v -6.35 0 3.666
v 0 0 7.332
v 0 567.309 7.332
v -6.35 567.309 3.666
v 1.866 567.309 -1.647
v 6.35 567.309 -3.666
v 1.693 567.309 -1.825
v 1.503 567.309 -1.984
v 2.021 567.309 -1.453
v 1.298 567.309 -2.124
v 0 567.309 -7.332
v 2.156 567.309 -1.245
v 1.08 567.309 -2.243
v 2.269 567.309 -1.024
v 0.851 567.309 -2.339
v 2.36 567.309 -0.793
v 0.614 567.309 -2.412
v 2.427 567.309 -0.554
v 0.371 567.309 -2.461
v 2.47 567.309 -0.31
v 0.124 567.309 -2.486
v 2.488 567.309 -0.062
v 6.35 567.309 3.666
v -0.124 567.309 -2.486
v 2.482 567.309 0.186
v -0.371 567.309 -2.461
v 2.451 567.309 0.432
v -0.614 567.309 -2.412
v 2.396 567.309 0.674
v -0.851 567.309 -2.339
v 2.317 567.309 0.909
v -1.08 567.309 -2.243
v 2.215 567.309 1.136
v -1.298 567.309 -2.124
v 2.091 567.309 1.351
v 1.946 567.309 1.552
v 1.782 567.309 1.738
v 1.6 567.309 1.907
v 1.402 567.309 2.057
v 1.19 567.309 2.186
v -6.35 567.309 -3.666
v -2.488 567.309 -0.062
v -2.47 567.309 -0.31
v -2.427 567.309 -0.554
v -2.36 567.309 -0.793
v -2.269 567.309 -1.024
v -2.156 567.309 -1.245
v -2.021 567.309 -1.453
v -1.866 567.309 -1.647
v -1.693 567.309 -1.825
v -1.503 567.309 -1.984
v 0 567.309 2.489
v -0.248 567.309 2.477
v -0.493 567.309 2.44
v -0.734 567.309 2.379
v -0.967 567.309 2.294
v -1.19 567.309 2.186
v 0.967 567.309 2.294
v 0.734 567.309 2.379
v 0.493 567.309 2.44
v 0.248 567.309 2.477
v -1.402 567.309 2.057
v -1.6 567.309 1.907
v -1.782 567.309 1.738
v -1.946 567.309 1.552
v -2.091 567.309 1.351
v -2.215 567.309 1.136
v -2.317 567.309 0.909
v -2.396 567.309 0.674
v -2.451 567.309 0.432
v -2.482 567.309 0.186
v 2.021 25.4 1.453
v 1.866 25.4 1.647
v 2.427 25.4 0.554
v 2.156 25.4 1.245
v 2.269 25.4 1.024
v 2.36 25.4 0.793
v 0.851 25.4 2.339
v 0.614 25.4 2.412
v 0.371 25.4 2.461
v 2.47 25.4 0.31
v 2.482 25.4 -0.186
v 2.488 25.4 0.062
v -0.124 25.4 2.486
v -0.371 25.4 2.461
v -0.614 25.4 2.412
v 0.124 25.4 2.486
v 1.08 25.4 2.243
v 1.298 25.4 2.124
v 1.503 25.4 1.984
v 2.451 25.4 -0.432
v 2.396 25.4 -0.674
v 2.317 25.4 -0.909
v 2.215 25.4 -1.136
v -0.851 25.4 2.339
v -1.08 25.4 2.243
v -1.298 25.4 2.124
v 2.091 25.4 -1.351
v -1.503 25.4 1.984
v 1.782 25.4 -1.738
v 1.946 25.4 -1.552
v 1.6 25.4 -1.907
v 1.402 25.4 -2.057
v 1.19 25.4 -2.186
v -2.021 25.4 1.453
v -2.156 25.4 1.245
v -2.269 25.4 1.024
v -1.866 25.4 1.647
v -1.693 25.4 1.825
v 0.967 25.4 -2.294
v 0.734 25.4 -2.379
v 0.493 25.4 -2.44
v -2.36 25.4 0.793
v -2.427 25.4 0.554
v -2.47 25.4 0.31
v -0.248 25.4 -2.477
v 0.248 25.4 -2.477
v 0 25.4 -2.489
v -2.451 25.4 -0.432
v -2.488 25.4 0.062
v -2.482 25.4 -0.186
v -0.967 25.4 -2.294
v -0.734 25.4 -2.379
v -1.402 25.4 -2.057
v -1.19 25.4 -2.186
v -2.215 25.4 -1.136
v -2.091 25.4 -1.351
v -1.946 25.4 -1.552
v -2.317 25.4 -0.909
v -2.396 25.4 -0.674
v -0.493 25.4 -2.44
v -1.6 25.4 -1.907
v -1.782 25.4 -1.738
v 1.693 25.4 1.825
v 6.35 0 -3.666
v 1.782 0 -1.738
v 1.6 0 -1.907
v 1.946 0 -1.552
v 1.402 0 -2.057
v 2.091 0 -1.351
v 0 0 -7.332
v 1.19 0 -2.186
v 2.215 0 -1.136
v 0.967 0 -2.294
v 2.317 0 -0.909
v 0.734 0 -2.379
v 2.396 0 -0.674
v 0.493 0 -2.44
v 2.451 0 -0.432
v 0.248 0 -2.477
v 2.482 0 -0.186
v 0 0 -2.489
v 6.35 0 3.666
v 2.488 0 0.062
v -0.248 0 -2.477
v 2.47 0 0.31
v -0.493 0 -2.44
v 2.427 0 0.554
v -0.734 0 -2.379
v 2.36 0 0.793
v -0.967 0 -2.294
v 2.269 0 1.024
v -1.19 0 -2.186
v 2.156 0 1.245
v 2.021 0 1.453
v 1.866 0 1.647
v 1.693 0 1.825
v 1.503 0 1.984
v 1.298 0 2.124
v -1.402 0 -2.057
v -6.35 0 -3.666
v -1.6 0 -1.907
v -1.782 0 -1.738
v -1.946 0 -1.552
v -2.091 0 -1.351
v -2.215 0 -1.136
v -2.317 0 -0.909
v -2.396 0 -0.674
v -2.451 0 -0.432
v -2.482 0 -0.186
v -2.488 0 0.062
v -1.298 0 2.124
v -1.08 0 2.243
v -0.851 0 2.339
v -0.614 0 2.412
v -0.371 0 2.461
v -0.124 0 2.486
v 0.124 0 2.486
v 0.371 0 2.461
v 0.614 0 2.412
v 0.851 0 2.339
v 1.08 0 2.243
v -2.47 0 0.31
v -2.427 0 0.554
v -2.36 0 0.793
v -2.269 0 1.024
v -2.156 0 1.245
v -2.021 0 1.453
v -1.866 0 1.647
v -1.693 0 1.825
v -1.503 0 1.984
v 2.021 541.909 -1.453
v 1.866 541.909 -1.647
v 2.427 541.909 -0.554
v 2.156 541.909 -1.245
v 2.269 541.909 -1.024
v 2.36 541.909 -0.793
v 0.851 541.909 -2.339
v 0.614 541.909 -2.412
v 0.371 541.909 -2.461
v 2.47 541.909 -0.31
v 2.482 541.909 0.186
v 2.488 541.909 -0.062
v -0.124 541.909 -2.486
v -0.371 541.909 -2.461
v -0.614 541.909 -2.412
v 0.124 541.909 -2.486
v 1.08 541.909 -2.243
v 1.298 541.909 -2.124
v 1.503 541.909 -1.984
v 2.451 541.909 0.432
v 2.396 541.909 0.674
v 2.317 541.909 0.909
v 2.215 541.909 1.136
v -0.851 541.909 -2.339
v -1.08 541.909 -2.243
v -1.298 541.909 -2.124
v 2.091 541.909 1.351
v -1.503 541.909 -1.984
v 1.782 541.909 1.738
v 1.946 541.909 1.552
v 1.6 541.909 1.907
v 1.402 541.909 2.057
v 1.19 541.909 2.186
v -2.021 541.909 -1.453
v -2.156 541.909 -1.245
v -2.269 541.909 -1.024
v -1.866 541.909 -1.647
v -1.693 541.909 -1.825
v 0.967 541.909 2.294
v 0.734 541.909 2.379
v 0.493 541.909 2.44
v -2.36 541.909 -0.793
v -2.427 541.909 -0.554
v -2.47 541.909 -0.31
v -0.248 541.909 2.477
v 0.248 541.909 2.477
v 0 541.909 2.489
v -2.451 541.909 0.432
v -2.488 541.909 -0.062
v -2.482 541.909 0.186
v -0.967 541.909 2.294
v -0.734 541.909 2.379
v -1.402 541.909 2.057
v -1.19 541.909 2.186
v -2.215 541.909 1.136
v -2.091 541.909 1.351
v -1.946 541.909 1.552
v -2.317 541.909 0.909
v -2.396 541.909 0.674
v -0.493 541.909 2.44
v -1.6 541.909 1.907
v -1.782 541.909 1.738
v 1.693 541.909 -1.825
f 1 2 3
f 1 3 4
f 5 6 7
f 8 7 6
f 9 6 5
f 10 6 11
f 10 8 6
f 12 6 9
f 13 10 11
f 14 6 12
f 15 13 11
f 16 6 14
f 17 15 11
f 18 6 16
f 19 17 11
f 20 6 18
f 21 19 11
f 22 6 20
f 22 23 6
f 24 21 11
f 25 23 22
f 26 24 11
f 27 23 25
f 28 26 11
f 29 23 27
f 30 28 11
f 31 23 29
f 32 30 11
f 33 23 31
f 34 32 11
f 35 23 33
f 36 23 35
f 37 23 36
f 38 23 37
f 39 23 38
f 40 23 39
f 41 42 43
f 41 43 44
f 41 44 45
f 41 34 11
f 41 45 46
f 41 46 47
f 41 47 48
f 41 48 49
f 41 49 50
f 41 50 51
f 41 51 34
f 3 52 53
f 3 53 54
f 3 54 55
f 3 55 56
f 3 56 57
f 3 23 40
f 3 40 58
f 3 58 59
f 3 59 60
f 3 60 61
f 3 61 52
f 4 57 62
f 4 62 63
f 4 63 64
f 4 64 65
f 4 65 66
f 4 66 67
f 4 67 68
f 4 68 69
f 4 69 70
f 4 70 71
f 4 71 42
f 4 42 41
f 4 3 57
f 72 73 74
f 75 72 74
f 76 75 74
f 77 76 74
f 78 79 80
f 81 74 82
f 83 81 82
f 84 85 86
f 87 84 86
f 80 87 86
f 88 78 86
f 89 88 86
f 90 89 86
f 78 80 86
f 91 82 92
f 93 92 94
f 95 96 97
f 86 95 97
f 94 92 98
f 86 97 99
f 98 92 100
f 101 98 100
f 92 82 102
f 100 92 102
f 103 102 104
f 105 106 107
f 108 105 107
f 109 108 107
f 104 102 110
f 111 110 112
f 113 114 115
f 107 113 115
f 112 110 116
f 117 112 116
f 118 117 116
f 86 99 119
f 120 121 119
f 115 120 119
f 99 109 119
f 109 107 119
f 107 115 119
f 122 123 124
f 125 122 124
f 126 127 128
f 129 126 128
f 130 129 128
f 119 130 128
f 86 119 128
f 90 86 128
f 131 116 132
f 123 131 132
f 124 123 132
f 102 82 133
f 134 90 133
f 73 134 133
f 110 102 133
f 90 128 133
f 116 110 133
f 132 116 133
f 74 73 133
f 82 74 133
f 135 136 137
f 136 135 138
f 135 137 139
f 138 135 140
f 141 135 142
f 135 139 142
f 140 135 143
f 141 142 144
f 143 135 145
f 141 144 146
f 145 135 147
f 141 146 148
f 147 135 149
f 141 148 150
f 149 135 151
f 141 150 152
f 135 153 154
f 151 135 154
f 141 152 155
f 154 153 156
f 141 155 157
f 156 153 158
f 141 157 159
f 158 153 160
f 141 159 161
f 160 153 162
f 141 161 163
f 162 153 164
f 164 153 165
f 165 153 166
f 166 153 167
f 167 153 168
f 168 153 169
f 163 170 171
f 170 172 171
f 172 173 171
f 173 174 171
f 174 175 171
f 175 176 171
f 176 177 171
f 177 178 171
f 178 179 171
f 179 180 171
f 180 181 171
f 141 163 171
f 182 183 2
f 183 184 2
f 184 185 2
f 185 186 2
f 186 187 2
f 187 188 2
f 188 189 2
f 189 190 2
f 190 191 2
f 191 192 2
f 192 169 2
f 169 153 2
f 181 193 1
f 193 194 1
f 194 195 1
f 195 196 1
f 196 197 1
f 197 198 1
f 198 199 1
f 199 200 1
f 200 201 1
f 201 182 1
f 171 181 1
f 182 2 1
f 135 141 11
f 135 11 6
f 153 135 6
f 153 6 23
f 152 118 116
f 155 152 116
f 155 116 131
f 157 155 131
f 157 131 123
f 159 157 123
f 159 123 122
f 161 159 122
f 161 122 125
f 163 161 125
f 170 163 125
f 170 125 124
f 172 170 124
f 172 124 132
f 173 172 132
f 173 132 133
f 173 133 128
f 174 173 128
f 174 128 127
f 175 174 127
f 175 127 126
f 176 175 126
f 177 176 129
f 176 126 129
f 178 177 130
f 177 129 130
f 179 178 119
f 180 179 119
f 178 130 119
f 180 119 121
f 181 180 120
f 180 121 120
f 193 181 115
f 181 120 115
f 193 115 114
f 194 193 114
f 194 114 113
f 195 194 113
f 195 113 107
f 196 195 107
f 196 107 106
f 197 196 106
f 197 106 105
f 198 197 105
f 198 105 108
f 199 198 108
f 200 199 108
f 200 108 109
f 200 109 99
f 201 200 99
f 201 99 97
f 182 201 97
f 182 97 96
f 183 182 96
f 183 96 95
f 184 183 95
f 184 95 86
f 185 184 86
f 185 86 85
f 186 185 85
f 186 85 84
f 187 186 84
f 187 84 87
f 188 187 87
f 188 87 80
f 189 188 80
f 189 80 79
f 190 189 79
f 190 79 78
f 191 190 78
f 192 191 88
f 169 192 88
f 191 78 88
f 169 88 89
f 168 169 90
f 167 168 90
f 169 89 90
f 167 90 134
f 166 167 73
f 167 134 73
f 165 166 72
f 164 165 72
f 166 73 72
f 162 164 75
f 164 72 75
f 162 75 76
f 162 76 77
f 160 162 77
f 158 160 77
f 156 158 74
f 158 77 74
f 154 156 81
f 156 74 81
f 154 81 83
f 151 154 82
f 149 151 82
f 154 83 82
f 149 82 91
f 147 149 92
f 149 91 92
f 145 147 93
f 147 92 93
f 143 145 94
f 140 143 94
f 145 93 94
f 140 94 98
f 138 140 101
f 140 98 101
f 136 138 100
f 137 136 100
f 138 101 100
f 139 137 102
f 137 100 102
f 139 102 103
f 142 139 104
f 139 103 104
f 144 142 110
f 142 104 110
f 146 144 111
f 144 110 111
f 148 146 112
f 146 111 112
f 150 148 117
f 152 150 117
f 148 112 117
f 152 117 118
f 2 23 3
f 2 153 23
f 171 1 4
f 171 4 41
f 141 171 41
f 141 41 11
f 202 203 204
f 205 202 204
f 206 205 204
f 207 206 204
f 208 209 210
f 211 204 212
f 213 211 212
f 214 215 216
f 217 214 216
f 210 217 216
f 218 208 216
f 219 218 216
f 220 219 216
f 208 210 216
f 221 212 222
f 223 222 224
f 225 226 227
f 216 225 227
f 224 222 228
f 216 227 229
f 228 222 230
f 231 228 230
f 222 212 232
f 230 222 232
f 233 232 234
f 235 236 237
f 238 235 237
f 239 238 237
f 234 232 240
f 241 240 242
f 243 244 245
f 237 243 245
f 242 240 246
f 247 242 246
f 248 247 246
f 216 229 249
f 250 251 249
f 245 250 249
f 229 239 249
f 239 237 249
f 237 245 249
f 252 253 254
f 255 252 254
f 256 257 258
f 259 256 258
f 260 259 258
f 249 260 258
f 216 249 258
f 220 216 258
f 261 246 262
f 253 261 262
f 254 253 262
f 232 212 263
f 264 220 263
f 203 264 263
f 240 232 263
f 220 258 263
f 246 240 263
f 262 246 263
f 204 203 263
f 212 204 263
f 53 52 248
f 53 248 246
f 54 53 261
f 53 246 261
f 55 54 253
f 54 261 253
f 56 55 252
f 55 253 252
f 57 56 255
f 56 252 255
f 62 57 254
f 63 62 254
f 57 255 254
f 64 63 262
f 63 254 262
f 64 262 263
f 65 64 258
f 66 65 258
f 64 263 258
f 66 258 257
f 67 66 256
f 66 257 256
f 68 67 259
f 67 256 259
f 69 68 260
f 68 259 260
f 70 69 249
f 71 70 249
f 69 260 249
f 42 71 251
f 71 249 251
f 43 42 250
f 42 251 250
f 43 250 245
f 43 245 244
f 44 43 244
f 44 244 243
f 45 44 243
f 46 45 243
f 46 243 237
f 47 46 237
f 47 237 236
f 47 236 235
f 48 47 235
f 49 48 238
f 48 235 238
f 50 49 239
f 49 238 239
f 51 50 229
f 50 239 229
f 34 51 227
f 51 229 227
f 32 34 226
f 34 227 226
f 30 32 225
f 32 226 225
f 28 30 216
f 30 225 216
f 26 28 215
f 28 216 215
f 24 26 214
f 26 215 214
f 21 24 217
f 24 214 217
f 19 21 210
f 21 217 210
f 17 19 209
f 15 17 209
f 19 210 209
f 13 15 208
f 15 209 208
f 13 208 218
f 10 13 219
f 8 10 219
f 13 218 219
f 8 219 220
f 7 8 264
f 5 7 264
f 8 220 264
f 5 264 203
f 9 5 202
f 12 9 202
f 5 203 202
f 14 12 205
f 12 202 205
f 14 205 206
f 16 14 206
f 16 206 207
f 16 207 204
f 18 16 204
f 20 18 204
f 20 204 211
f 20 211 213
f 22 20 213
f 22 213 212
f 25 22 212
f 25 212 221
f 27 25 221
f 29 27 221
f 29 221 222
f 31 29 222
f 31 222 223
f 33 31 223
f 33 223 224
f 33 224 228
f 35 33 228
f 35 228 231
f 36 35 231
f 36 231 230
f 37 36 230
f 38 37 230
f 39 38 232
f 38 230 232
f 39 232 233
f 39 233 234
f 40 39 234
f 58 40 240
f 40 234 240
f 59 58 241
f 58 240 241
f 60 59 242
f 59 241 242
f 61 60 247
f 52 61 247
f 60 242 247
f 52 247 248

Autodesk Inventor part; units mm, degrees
ref_plane "YZ Plane" through (0, 0, 0) normal (1, 0, 0) x (0, 1, 0)
ref_plane "XZ Plane" through (0, 0, 0) normal (0, 1, 0) x (-1, 0, 0)
ref_plane "XY Plane" through (0, 0, 0) normal (0, 0, 1) x (1, 0, 0)
sketch "Sketch1" plane through (0, 0, 0) normal (0, 1, 0) x (-1, 0, 0)
  line L0 (6.35, -3.6662) -> (0, -7.3323)
  line L1 (0, -7.3323) -> (-6.35, -3.6662)
  line L2 (-6.35, -3.6662) -> (-6.35, 3.6662)
  line L3 (-6.35, 3.6662) -> (0, 7.3323)
  line L4 (0, 7.3323) -> (6.35, 3.6662)
  line L5 (6.35, 3.6662) -> (6.35, -3.6662)
  point P0 (0, 0)
  point P1 (0, 0)
  point P2 (0, 0)
  dimension "d0" = 12.7
extrude "Extrusion1" add sketch "Sketch1" along normal blind 567.309
sketch "Sketch2" plane through (0, 0, 0) normal (0, -1, 0) x (1, 0, 0)
  point P0 (0, 0)
  point P1 (0, 0)
hole "Hole1" at (0, 0, 0) direction (0, 1, 0) diameter 4.9784 depth 25.4 thread size "1/4-20 UNC" class "2B" standard "ANSI Unified Screw Threads"
sketch "Sketch3" plane through (0, 567.309, 0) normal (0, 1, 0) x (1, 0, 0)
  point P0 (0, 0)
  point P1 (0, 0)
hole "Hole2" at (0, 567.309, 0) direction (0, -1, 0) diameter 4.9784 depth 25.4 thread size "1/4-20 UNC" class "2B" standard "ANSI Unified Screw Threads"
properties part number "INTK_004_HexShaft6" material "Aluminum 6061"
